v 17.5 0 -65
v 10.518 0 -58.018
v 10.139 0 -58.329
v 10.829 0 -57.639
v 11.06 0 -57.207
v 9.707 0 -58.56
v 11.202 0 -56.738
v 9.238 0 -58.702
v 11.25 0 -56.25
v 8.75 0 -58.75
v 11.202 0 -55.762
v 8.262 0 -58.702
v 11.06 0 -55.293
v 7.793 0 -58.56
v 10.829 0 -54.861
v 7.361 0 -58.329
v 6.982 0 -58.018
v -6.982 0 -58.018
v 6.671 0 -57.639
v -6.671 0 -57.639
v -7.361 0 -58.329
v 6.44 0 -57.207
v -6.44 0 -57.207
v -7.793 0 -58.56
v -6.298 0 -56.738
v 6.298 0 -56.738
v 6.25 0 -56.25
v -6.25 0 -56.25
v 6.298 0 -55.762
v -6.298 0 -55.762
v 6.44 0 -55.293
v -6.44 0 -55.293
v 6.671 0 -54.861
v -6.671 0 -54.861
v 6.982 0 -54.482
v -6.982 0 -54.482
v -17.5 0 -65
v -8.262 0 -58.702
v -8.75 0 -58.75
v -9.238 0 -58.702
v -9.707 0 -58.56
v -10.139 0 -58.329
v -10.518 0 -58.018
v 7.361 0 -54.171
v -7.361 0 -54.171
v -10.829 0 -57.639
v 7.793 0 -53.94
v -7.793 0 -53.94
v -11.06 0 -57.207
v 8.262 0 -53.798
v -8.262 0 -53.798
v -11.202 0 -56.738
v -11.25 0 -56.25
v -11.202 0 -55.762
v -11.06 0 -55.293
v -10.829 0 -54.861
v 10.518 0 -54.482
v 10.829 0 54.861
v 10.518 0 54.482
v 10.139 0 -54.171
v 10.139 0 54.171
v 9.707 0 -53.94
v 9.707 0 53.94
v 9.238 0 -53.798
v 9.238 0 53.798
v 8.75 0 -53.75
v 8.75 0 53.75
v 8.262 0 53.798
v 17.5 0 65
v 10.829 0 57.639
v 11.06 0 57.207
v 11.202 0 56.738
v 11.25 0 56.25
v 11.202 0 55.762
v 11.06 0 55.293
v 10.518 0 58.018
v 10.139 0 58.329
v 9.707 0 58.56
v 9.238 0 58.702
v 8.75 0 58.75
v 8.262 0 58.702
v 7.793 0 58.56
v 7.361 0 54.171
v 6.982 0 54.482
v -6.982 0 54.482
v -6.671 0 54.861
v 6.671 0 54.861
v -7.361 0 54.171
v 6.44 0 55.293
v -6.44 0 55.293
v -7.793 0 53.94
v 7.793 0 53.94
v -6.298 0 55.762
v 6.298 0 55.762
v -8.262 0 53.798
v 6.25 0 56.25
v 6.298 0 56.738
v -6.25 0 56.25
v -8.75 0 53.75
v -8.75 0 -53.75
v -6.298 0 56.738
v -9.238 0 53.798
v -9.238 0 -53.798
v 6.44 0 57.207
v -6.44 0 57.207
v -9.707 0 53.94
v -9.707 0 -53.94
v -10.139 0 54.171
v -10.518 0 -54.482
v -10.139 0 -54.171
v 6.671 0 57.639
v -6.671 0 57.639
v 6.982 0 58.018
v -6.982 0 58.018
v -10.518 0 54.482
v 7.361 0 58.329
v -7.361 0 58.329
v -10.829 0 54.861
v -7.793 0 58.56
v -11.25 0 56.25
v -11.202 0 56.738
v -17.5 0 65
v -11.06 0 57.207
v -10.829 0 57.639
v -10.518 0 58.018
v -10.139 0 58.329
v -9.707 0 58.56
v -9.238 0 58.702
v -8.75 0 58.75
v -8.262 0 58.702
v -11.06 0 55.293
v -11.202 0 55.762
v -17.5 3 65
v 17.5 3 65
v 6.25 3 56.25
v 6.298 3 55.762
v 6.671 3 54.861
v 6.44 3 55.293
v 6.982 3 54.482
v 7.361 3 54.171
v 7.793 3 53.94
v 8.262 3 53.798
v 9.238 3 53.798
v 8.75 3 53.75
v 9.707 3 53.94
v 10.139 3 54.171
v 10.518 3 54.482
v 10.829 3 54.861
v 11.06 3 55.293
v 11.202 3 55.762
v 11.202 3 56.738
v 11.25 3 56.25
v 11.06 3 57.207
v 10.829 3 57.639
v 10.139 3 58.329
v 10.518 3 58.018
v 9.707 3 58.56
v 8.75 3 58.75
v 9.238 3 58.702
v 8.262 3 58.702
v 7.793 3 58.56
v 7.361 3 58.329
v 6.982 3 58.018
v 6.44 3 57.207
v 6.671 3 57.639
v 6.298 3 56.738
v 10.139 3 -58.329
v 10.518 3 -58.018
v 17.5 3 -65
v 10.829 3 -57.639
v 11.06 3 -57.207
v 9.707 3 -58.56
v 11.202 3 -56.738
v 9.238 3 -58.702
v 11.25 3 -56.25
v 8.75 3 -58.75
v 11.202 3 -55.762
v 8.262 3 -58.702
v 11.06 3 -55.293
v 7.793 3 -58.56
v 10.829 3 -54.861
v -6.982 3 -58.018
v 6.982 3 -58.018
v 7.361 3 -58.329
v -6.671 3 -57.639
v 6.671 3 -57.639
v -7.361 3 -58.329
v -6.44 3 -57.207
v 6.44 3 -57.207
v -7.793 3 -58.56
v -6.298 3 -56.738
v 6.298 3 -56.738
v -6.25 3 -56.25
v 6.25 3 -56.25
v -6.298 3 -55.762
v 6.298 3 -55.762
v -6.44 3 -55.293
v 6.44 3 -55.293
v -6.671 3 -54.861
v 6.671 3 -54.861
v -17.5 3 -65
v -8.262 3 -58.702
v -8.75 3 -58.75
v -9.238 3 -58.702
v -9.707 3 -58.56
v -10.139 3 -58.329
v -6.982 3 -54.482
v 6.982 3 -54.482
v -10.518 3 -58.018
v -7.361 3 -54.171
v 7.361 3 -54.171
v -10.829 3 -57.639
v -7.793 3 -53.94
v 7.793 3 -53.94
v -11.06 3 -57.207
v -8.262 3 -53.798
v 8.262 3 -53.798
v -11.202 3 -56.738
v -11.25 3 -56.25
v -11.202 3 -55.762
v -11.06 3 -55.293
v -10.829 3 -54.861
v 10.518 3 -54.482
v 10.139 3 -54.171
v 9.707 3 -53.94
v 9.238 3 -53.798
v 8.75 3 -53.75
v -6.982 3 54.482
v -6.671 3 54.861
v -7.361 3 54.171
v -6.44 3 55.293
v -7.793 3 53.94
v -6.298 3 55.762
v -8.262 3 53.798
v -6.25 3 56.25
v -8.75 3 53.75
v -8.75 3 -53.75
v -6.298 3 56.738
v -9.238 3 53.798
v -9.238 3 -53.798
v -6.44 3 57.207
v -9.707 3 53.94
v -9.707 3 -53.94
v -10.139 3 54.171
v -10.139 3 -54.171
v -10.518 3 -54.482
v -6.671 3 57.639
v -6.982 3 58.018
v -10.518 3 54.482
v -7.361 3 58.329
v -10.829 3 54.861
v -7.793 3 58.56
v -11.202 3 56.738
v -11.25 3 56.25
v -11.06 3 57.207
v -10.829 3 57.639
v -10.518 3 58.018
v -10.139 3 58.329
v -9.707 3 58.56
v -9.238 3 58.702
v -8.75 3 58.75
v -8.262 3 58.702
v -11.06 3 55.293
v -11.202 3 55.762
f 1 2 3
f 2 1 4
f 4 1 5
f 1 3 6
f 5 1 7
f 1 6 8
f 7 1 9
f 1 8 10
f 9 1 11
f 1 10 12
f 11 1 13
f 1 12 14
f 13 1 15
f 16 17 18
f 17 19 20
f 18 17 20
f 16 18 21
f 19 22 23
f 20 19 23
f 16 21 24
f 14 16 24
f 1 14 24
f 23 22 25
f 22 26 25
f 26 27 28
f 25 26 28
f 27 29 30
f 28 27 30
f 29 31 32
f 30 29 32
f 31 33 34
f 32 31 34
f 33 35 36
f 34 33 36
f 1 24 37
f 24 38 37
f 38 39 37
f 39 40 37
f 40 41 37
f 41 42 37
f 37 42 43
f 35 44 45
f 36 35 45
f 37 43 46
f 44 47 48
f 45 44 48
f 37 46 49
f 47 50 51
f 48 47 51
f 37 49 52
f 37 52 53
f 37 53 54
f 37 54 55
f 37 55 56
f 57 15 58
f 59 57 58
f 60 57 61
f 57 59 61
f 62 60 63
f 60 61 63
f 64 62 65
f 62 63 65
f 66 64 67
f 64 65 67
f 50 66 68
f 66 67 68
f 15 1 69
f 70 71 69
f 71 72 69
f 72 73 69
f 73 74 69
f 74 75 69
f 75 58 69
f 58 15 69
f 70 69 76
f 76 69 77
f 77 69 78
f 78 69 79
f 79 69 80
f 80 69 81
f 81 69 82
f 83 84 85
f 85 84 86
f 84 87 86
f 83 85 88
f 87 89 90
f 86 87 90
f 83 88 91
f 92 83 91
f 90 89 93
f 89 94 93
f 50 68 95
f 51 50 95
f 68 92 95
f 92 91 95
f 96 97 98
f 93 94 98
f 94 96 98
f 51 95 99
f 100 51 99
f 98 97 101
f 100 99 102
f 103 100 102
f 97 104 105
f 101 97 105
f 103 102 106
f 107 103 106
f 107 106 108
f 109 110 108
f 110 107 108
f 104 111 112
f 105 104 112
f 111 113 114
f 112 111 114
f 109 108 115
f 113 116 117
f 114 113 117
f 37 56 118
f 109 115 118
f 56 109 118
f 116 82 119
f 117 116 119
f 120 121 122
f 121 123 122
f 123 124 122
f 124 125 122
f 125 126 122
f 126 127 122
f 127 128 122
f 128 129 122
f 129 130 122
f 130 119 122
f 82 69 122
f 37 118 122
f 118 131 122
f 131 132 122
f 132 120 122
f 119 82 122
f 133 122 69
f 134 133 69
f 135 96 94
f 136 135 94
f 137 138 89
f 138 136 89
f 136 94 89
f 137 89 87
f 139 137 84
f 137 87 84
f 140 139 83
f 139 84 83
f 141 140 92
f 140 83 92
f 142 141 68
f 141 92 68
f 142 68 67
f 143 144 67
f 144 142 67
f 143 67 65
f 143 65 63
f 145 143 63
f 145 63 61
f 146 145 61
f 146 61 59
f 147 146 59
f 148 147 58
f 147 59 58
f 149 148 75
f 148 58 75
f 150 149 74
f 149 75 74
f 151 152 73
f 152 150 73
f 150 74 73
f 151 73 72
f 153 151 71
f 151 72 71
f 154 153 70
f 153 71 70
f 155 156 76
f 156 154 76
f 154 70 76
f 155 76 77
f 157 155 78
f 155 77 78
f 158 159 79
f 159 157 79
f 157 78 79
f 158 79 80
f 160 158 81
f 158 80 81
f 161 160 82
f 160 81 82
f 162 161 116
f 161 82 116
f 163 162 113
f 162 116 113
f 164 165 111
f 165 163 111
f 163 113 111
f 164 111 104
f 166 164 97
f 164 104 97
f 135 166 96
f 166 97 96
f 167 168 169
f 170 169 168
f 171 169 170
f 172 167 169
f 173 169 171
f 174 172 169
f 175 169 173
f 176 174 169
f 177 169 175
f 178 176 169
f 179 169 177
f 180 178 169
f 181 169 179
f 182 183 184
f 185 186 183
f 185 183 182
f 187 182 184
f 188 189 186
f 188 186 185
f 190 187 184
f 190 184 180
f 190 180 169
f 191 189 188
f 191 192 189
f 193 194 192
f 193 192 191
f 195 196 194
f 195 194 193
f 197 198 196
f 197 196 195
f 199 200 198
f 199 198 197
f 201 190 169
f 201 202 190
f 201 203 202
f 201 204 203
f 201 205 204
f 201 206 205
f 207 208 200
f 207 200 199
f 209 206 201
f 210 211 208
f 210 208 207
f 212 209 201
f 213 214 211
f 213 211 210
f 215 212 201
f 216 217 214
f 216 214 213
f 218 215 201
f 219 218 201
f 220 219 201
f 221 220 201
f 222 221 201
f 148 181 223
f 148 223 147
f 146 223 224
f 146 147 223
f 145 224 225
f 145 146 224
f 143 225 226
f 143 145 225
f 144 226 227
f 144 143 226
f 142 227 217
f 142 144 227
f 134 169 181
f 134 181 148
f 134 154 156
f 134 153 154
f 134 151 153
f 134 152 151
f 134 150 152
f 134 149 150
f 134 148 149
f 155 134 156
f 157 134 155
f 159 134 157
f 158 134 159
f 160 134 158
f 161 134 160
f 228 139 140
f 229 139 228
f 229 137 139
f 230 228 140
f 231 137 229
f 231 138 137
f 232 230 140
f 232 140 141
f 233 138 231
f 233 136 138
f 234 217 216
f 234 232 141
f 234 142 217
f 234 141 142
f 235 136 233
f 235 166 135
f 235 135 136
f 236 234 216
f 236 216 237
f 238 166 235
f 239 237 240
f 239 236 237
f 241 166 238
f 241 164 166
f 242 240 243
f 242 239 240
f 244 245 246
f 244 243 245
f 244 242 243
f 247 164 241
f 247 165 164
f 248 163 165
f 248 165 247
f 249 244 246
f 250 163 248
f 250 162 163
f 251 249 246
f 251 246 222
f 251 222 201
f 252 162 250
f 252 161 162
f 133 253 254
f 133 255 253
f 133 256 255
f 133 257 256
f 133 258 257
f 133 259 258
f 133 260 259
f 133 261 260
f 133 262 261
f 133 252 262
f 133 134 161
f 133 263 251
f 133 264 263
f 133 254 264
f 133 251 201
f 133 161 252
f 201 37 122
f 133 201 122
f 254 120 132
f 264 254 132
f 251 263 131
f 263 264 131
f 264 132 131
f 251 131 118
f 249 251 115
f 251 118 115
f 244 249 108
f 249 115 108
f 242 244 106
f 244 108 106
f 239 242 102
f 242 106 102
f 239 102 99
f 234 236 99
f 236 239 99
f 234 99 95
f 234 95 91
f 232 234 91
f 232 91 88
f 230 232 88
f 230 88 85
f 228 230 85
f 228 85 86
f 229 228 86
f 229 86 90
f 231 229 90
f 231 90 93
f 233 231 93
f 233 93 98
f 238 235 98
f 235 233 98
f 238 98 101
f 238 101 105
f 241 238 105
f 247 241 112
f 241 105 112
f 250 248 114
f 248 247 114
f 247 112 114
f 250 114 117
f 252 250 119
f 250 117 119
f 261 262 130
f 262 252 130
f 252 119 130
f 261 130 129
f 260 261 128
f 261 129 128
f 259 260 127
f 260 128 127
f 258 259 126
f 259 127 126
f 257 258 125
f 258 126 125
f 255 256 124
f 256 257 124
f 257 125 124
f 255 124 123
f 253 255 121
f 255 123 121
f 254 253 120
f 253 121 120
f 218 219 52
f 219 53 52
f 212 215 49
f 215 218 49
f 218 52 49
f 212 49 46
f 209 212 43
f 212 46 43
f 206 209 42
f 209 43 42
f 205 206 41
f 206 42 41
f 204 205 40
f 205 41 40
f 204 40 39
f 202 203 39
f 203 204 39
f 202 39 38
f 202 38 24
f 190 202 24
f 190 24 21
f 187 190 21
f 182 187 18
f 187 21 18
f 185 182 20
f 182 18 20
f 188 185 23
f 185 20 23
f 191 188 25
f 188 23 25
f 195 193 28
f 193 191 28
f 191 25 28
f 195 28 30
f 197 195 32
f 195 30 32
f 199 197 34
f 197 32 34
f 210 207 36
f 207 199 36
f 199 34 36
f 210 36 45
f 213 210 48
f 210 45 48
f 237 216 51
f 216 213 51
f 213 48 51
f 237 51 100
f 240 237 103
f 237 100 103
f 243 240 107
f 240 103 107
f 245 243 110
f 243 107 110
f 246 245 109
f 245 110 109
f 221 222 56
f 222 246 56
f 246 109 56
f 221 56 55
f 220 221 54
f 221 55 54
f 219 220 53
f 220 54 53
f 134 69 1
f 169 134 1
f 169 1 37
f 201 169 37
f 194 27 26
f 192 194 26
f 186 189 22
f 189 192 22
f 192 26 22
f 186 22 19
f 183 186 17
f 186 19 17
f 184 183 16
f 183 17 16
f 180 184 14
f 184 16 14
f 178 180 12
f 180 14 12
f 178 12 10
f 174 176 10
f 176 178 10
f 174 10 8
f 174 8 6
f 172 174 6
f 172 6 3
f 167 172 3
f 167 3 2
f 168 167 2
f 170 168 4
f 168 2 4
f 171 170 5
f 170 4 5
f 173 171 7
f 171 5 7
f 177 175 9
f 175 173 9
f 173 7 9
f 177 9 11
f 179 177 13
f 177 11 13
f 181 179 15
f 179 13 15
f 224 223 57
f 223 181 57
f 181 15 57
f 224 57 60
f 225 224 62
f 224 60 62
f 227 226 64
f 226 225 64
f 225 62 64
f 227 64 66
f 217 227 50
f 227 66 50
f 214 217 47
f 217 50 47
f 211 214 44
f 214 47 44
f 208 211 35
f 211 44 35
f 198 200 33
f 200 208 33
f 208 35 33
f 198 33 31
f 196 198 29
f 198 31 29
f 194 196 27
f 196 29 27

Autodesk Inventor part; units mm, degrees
ref_plane "YZ Plane" through (0, 0, 0) normal (1, 0, 0) x (0, 1, 0)
ref_plane "XZ Plane" through (0, 0, 0) normal (0, 1, 0) x (-1, 0, 0)
ref_plane "XY Plane" through (0, 0, 0) normal (0, 0, 1) x (1, 0, 0)
sketch "Sketch1" plane through (0, 0, 0) normal (0, 1, 0) x (-1, 0, 0)
  line L0 (17.5, 65) -> (-17.5, 65)
  line L1 (-17.5, 65) -> (-17.5, -65)
  line L2 (-17.5, -65) -> (17.5, -65)
  line L3 (17.5, -65) -> (17.5, 65)
  line L4 (17.5, 65) -> (-17.5, -65) construction
  line L5 (-17.5, 65) -> (17.5, -65) construction
  line L6 (-17.5, 65) -> (0, 65)
  line L7 (0, 65) -> (0, 47.5)
  line L8 (0, 47.5) -> (-17.5, 47.5)
  line L9 (-17.5, 47.5) -> (-17.5, 65)
  line L10 (17.5, 65) -> (0, 65)
  line L11 (0, 65) -> (0, 47.5)
  line L12 (0, 47.5) -> (17.5, 47.5)
  line L13 (17.5, 47.5) -> (17.5, 65)
  line L14 (17.5, -65) -> (0, -65)
  line L15 (0, -65) -> (0, -47.5)
  line L16 (0, -47.5) -> (17.5, -47.5)
  line L17 (17.5, -47.5) -> (17.5, -65)
  line L18 (0, -47.5) -> (-17.5, -47.5)
  line L19 (-17.5, -47.5) -> (-17.5, -65)
  line L20 (-17.5, -65) -> (0, -65)
  line L21 (0, -65) -> (0, -47.5)
  circle A0 centre (8.75, 56.25) radius 2.5
  circle A1 centre (-8.75, 56.25) radius 2.5
  circle A2 centre (8.75, -56.25) radius 2.5
  circle A3 centre (-8.75, -56.25) radius 2.5
  point P0 (0, 0)
  dimension "d0" = 35
  dimension "d1" = 130
  dimension "d2" = 17.5
  dimension "d3" = 17.5
  dimension "d4" = 17.5
  dimension "d5" = 17.5
  dimension "d6" = 5
  dimension "d7" = 5
  dimension "d8" = 5
  dimension "d9" = 5
  dimension "d10" = 17.5
  dimension "d11" = 17.5
  dimension "d12" = 8.75
  dimension "d13" = 8.75
  dimension "d14" = 8.75
  dimension "d15" = 8.75
  dimension "d16" = 8.75
  dimension "d17" = 8.75
extrude "Extrusion1" add sketch "Sketch1" along normal blind 3
properties part number "cap"
